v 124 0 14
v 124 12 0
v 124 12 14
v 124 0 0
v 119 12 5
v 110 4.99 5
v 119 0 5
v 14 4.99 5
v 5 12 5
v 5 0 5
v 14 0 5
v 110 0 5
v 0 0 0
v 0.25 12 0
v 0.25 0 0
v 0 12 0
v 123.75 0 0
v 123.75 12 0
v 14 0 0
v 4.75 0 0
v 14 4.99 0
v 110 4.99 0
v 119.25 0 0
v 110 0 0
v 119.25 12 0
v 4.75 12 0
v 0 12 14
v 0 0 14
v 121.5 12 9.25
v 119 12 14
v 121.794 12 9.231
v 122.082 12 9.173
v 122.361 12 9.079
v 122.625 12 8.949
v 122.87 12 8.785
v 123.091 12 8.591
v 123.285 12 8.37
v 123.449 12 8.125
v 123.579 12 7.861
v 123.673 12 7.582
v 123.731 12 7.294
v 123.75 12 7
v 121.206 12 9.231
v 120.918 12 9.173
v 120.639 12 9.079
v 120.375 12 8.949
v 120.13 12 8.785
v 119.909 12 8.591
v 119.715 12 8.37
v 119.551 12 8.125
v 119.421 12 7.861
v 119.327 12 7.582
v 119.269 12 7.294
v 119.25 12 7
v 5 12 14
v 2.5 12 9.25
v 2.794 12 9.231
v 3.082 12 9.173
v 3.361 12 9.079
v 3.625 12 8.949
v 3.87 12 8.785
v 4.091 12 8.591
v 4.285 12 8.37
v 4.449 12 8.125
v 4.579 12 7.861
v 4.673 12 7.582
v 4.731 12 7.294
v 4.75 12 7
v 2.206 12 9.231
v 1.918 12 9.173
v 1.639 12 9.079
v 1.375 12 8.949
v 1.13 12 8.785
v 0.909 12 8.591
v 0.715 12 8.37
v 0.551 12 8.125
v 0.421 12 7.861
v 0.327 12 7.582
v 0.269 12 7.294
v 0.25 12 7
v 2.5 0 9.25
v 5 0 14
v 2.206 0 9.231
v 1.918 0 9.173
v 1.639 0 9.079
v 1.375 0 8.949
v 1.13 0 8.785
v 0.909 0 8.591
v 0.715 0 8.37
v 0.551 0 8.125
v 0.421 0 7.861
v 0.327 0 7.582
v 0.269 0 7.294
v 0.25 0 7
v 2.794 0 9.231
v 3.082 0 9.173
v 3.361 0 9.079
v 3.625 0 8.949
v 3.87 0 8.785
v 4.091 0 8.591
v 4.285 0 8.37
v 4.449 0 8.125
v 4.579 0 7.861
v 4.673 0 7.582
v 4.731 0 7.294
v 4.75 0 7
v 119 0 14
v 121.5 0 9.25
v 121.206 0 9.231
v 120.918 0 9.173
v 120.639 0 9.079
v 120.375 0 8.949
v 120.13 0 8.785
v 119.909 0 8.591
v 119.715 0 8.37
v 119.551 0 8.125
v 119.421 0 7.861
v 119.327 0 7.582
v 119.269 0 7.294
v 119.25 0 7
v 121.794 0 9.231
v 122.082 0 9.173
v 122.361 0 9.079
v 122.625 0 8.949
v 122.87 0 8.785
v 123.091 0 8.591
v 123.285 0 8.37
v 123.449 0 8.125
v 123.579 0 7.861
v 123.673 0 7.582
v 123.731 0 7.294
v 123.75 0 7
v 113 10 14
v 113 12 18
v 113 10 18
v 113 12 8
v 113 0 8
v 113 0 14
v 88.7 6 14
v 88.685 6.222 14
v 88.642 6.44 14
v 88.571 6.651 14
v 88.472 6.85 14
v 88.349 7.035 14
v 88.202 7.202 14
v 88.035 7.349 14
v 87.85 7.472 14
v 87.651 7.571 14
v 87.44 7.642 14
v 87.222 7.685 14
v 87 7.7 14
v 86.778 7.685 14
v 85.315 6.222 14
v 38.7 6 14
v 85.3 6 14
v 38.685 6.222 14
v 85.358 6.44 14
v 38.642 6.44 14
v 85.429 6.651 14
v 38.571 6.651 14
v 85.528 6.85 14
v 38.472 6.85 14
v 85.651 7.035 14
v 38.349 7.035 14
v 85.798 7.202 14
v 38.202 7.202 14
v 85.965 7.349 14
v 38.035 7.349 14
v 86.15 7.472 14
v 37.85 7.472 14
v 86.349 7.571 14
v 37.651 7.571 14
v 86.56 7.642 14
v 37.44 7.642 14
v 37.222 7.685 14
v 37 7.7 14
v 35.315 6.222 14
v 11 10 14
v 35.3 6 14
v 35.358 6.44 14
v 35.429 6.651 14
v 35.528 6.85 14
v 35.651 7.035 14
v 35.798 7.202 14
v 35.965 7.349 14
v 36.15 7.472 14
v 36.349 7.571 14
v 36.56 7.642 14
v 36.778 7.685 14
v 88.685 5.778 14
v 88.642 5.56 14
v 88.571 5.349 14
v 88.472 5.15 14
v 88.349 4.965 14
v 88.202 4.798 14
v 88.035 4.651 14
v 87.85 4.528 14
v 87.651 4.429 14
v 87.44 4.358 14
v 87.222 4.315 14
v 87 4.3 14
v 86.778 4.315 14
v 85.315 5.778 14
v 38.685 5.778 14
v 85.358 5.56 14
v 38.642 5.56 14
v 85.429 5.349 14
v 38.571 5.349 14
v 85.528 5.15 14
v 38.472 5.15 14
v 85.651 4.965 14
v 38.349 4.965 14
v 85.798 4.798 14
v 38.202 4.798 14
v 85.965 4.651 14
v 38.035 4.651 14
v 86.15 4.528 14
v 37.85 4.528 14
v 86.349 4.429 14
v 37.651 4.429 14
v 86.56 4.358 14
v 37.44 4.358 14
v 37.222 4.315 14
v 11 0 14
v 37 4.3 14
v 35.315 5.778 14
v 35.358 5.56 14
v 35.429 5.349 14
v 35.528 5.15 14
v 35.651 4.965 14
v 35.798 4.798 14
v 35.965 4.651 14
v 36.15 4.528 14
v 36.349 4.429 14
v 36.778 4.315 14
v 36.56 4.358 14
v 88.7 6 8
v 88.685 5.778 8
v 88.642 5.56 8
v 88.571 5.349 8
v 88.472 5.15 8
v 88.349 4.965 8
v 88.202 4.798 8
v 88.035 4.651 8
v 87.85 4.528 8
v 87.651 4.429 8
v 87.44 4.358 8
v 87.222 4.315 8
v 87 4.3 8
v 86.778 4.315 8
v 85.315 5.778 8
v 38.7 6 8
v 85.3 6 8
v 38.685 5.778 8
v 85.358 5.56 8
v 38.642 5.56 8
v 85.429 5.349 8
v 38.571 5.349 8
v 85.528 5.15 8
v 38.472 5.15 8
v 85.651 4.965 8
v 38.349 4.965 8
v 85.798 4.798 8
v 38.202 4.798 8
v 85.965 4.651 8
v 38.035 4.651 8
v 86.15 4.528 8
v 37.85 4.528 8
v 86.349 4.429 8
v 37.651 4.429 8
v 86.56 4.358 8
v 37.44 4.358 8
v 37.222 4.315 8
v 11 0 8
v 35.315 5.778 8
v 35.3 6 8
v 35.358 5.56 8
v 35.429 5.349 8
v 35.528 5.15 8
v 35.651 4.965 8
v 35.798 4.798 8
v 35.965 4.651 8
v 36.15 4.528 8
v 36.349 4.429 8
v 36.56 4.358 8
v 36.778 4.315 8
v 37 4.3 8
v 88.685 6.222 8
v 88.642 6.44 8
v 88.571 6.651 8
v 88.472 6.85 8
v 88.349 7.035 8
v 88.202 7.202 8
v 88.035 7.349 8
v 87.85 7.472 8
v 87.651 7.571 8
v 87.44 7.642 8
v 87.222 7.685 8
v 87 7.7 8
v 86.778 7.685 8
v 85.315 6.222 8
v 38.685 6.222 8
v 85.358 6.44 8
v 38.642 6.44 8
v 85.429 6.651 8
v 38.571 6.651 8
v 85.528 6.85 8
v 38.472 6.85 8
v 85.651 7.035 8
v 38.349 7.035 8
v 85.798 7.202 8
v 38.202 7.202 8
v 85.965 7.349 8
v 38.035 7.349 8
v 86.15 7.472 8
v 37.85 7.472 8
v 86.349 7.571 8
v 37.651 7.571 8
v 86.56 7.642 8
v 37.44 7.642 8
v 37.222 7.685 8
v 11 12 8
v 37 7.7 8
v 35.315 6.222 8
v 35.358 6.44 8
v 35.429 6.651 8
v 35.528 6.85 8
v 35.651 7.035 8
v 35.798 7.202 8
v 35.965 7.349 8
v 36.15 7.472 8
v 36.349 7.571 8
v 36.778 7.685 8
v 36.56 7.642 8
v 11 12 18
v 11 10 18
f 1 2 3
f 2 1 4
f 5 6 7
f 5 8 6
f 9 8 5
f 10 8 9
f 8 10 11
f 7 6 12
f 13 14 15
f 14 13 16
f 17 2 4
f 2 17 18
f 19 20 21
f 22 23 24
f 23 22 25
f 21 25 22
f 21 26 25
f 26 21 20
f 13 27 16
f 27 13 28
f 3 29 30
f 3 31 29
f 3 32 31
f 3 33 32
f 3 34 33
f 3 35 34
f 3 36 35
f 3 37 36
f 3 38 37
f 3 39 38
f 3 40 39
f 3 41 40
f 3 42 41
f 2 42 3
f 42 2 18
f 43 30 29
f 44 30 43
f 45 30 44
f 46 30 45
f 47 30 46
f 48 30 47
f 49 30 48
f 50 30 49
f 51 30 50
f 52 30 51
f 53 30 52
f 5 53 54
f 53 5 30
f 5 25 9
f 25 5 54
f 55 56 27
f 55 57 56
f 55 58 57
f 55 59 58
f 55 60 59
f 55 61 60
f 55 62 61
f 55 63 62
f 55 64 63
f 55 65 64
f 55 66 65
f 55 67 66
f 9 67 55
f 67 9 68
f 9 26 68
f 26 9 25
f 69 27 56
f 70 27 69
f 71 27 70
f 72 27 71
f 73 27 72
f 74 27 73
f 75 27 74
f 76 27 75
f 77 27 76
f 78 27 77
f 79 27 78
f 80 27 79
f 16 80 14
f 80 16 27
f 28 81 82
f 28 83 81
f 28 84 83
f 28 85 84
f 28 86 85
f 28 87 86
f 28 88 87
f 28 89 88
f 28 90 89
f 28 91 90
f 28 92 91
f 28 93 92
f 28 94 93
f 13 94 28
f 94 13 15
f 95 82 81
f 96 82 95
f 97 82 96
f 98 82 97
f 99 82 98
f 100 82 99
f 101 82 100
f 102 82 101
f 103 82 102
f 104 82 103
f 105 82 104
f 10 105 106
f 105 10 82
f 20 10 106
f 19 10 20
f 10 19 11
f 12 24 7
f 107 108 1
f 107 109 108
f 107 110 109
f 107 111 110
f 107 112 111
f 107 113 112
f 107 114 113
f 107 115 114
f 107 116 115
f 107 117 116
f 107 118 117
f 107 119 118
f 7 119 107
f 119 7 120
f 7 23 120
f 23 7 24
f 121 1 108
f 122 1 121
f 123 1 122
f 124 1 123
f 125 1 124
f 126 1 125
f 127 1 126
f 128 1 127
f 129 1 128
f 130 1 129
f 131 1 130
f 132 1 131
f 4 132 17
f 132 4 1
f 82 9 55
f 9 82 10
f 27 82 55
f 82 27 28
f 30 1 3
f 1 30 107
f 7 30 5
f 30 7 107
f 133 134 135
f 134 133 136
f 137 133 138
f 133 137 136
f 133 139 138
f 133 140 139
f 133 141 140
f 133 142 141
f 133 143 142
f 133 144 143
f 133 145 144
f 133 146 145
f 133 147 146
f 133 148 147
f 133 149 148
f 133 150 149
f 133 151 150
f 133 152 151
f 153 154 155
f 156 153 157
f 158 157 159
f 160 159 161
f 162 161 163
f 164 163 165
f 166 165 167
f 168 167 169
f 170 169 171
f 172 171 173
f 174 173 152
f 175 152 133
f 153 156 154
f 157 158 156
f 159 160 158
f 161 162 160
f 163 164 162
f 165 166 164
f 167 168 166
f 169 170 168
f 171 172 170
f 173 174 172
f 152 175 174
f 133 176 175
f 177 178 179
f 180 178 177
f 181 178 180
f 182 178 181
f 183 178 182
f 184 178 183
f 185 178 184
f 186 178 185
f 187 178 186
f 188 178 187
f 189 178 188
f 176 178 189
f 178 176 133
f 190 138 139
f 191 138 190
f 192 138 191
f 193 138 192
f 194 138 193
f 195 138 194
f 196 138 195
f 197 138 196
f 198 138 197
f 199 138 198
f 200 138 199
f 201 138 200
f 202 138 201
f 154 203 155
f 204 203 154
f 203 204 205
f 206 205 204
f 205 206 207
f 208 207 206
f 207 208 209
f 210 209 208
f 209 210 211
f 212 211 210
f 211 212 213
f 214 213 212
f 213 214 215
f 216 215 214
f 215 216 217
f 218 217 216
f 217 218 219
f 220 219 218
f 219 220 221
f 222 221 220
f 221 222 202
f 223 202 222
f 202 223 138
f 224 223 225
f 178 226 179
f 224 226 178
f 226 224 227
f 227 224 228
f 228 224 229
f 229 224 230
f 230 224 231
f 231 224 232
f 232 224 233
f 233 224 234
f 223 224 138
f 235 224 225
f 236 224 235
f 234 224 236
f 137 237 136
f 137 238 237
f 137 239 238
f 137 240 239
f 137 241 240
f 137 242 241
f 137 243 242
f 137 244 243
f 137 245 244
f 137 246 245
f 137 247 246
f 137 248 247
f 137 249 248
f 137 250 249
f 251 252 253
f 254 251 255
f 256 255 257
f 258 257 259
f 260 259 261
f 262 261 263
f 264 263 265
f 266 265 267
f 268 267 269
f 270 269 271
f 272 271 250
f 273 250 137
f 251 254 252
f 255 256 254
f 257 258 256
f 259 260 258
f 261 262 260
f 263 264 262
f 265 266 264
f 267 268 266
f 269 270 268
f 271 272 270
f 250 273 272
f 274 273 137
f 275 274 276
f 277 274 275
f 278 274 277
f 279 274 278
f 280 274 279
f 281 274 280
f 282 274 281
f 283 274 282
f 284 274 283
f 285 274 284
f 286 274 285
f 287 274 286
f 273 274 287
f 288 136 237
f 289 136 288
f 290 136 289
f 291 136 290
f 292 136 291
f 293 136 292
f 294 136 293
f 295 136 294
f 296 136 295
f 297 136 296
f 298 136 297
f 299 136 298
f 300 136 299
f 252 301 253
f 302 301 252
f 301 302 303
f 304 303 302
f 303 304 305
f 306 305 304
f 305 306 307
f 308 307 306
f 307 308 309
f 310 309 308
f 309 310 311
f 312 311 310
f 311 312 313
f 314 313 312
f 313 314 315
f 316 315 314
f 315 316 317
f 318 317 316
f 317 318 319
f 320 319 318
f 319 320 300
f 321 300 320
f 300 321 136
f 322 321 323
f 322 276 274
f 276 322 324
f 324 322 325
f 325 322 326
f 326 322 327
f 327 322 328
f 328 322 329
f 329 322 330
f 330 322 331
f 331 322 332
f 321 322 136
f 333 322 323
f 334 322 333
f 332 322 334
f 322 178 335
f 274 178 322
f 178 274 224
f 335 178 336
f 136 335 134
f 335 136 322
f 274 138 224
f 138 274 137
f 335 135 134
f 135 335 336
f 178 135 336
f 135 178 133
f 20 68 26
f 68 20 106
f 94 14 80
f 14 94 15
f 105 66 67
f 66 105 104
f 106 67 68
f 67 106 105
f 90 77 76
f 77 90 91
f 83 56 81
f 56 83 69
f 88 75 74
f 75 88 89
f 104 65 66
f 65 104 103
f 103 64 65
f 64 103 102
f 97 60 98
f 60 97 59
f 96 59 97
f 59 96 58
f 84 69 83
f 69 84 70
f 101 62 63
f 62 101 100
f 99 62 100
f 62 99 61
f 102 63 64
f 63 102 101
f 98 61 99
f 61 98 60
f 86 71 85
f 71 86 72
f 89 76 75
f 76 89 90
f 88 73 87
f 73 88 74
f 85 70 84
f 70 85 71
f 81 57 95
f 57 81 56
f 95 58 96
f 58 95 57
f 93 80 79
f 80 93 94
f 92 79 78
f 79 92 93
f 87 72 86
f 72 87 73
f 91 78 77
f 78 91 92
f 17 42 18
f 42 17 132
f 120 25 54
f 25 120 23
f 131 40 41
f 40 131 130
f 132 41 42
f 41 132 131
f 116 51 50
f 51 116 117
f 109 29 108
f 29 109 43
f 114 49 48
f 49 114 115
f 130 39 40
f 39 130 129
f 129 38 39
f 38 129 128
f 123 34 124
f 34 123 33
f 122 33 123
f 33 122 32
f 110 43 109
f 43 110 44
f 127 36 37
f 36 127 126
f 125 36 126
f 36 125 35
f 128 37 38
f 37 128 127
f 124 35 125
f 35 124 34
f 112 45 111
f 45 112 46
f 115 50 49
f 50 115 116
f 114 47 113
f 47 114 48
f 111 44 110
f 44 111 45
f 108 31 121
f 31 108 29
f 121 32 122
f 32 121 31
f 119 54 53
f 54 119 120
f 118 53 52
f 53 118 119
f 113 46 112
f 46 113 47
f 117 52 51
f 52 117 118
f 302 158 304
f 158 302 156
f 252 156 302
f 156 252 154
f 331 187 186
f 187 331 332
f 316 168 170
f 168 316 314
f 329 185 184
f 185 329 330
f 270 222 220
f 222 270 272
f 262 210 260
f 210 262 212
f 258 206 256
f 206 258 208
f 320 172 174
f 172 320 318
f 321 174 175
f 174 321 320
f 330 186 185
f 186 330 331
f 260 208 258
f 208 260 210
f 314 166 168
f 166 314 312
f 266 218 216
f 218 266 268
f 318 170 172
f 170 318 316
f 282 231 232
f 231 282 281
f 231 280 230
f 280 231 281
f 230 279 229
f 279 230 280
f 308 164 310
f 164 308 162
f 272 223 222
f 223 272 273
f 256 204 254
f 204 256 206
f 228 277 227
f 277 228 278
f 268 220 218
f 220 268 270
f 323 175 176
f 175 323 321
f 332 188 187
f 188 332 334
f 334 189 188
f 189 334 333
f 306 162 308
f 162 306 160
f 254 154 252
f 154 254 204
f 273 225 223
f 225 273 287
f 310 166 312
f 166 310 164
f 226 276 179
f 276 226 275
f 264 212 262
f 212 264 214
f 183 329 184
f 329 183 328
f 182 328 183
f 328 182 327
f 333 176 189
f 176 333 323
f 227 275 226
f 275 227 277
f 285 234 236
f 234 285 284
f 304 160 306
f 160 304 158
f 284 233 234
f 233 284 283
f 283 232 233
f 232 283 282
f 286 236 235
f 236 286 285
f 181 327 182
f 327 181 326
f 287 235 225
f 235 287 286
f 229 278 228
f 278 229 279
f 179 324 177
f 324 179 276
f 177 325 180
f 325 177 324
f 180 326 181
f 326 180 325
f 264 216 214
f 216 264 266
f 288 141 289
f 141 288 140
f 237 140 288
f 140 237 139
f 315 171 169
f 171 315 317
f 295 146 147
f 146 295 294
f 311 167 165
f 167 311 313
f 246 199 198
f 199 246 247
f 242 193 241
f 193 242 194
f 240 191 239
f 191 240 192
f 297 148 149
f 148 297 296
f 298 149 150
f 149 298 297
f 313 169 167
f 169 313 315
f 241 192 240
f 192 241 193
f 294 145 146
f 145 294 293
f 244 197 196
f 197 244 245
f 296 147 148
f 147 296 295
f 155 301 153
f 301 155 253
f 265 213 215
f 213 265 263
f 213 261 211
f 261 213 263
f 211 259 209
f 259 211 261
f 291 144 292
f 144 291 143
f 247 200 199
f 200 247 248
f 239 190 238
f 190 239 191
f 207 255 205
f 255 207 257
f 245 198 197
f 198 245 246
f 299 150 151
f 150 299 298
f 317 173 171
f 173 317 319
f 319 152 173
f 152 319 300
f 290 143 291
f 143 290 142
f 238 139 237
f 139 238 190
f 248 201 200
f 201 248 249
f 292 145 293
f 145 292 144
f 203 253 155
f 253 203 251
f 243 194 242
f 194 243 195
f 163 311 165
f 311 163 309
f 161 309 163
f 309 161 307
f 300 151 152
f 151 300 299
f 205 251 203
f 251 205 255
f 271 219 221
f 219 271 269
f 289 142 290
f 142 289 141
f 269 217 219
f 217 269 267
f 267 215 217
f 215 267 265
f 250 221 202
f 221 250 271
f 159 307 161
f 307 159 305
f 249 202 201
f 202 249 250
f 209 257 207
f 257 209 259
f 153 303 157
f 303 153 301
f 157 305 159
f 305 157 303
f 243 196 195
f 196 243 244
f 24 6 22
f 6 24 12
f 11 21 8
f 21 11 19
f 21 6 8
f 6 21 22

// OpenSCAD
// ============================================================
// LED Bracket  (led_bracket.stl)
// ============================================================
// Mounts on the LED rail on the rear inner wall of each tray ring.
// Holds a 100×100mm LED panel above the growing tray.
// Vertical adjustment slot allows ±15mm from nominal position
// (nominal LED height: 100mm above tray surface).
//
// Print orientation: flat (largest face down).
//   Footprint: ~120×140mm.  Fits on 200×200mm bed.
//
// Assembly:
//   1. Slide bracket onto ring's rear LED rail.
//   2. Set LED panel into the panel pocket.
//   3. Secure with 2× M3×12mm bolts through adjustment slot.
//   4. Route LED cable through ring's front wall pass-through.
//
// Material: PETG, 30% infill.
// ============================================================

include <params.scad>

module led_bracket() {

    // Wall-mount flange (attaches to ring rear inner wall rail)
    // Width: led_panel_w + 2*brkt_flange_w = 124mm
    // Depth: 16mm (fits over 8mm rail, 8mm clearance)
    flange_total_w = led_panel_w + 2*brkt_flange_w;
    flange_depth   = enc_wall + 8;   // Rail thickness + clearance

    // Overall bracket arm length (from wall to LED panel face)
    arm_len = led_nom_h - grow_ledge_z - tray_h + 20;

    difference() {
        union() {

            // --- Wall-mount flange ---
            cube([flange_total_w, flange_depth, brkt_arm_t]);

            // --- Vertical adjustment arms (left and right) ---
            // Connect flange to LED panel pocket
            // Left arm
            translate([0, 0, 0])
                cube([brkt_arm_t, flange_depth, arm_len]);
            // Right arm
            translate([flange_total_w - brkt_arm_t, 0, 0])
                cube([brkt_arm_t, flange_depth, arm_len]);

            // --- LED panel pocket (at top of arms) ---
            // Pocket: led_panel_w + 2mm clearance wide, 4mm deep
            translate([brkt_flange_w - 1, 0, arm_len - led_panel_t - 2])
                cube([led_panel_w + 2, flange_depth, led_panel_t + 2]);

            // --- LED panel retainer lip (prevents panel sliding forward) ---
            translate([brkt_flange_w - 1, flange_depth - 2, arm_len])
                cube([led_panel_w + 2, 2, 4]);

        } // end union

        // --- Vertical adjustment slot (centred on left arm) ---
        // Allows M3 bolt to slide ±15mm from nominal position
        translate([brkt_arm_t/2,
                   flange_depth/2,
                   arm_len/2 - brkt_slot_l/2])
            union() {
                // Slot body
                translate([0, 0, brkt_slot_w/2])
                    cube([brkt_slot_w, flange_depth + 2*eps, brkt_slot_l - brkt_slot_w],
                         center=true);
                // Round ends
                translate([0, 0, brkt_slot_l/2])
                    rotate([90, 0, 0])
                        cylinder(d=brkt_slot_w, h=flange_depth + 2*eps, center=true);
                translate([0, 0, -brkt_slot_l/2 + brkt_slot_w])
                    rotate([90, 0, 0])
                        cylinder(d=brkt_slot_w, h=flange_depth + 2*eps, center=true);
            }

        // --- Same slot on right arm ---
        translate([flange_total_w - brkt_arm_t/2,
                   flange_depth/2,
                   arm_len/2 - brkt_slot_l/2])
            union() {
                translate([0, 0, brkt_slot_w/2])
                    cube([brkt_slot_w, flange_depth + 2*eps, brkt_slot_l - brkt_slot_w],
                         center=true);
                translate([0, 0, brkt_slot_l/2])
                    rotate([90, 0, 0])
                        cylinder(d=brkt_slot_w, h=flange_depth + 2*eps, center=true);
                translate([0, 0, -brkt_slot_l/2 + brkt_slot_w])
                    rotate([90, 0, 0])
                        cylinder(d=brkt_slot_w, h=flange_depth + 2*eps, center=true);
            }

        // --- Rail clip slot (underside of flange, grips ring LED rail) ---
        // T-slot: 8mm wide, 5mm deep — snaps onto ring's rear wall rail
        translate([brkt_flange_w + 2, -eps, -eps])
            cube([led_panel_w - 4, 5, brkt_arm_t + 2*eps]);

        // --- LED panel LED holes (2× M3 for panel retention, optional) ---
        for (hx = [brkt_flange_w + led_panel_w * 0.25,
                   brkt_flange_w + led_panel_w * 0.75])
            translate([hx, flange_depth/2, arm_len - led_panel_t - 2 - eps])
                cylinder(d=m3_clr, h=led_panel_t + 4);

    } // end difference
}

led_bracket();
